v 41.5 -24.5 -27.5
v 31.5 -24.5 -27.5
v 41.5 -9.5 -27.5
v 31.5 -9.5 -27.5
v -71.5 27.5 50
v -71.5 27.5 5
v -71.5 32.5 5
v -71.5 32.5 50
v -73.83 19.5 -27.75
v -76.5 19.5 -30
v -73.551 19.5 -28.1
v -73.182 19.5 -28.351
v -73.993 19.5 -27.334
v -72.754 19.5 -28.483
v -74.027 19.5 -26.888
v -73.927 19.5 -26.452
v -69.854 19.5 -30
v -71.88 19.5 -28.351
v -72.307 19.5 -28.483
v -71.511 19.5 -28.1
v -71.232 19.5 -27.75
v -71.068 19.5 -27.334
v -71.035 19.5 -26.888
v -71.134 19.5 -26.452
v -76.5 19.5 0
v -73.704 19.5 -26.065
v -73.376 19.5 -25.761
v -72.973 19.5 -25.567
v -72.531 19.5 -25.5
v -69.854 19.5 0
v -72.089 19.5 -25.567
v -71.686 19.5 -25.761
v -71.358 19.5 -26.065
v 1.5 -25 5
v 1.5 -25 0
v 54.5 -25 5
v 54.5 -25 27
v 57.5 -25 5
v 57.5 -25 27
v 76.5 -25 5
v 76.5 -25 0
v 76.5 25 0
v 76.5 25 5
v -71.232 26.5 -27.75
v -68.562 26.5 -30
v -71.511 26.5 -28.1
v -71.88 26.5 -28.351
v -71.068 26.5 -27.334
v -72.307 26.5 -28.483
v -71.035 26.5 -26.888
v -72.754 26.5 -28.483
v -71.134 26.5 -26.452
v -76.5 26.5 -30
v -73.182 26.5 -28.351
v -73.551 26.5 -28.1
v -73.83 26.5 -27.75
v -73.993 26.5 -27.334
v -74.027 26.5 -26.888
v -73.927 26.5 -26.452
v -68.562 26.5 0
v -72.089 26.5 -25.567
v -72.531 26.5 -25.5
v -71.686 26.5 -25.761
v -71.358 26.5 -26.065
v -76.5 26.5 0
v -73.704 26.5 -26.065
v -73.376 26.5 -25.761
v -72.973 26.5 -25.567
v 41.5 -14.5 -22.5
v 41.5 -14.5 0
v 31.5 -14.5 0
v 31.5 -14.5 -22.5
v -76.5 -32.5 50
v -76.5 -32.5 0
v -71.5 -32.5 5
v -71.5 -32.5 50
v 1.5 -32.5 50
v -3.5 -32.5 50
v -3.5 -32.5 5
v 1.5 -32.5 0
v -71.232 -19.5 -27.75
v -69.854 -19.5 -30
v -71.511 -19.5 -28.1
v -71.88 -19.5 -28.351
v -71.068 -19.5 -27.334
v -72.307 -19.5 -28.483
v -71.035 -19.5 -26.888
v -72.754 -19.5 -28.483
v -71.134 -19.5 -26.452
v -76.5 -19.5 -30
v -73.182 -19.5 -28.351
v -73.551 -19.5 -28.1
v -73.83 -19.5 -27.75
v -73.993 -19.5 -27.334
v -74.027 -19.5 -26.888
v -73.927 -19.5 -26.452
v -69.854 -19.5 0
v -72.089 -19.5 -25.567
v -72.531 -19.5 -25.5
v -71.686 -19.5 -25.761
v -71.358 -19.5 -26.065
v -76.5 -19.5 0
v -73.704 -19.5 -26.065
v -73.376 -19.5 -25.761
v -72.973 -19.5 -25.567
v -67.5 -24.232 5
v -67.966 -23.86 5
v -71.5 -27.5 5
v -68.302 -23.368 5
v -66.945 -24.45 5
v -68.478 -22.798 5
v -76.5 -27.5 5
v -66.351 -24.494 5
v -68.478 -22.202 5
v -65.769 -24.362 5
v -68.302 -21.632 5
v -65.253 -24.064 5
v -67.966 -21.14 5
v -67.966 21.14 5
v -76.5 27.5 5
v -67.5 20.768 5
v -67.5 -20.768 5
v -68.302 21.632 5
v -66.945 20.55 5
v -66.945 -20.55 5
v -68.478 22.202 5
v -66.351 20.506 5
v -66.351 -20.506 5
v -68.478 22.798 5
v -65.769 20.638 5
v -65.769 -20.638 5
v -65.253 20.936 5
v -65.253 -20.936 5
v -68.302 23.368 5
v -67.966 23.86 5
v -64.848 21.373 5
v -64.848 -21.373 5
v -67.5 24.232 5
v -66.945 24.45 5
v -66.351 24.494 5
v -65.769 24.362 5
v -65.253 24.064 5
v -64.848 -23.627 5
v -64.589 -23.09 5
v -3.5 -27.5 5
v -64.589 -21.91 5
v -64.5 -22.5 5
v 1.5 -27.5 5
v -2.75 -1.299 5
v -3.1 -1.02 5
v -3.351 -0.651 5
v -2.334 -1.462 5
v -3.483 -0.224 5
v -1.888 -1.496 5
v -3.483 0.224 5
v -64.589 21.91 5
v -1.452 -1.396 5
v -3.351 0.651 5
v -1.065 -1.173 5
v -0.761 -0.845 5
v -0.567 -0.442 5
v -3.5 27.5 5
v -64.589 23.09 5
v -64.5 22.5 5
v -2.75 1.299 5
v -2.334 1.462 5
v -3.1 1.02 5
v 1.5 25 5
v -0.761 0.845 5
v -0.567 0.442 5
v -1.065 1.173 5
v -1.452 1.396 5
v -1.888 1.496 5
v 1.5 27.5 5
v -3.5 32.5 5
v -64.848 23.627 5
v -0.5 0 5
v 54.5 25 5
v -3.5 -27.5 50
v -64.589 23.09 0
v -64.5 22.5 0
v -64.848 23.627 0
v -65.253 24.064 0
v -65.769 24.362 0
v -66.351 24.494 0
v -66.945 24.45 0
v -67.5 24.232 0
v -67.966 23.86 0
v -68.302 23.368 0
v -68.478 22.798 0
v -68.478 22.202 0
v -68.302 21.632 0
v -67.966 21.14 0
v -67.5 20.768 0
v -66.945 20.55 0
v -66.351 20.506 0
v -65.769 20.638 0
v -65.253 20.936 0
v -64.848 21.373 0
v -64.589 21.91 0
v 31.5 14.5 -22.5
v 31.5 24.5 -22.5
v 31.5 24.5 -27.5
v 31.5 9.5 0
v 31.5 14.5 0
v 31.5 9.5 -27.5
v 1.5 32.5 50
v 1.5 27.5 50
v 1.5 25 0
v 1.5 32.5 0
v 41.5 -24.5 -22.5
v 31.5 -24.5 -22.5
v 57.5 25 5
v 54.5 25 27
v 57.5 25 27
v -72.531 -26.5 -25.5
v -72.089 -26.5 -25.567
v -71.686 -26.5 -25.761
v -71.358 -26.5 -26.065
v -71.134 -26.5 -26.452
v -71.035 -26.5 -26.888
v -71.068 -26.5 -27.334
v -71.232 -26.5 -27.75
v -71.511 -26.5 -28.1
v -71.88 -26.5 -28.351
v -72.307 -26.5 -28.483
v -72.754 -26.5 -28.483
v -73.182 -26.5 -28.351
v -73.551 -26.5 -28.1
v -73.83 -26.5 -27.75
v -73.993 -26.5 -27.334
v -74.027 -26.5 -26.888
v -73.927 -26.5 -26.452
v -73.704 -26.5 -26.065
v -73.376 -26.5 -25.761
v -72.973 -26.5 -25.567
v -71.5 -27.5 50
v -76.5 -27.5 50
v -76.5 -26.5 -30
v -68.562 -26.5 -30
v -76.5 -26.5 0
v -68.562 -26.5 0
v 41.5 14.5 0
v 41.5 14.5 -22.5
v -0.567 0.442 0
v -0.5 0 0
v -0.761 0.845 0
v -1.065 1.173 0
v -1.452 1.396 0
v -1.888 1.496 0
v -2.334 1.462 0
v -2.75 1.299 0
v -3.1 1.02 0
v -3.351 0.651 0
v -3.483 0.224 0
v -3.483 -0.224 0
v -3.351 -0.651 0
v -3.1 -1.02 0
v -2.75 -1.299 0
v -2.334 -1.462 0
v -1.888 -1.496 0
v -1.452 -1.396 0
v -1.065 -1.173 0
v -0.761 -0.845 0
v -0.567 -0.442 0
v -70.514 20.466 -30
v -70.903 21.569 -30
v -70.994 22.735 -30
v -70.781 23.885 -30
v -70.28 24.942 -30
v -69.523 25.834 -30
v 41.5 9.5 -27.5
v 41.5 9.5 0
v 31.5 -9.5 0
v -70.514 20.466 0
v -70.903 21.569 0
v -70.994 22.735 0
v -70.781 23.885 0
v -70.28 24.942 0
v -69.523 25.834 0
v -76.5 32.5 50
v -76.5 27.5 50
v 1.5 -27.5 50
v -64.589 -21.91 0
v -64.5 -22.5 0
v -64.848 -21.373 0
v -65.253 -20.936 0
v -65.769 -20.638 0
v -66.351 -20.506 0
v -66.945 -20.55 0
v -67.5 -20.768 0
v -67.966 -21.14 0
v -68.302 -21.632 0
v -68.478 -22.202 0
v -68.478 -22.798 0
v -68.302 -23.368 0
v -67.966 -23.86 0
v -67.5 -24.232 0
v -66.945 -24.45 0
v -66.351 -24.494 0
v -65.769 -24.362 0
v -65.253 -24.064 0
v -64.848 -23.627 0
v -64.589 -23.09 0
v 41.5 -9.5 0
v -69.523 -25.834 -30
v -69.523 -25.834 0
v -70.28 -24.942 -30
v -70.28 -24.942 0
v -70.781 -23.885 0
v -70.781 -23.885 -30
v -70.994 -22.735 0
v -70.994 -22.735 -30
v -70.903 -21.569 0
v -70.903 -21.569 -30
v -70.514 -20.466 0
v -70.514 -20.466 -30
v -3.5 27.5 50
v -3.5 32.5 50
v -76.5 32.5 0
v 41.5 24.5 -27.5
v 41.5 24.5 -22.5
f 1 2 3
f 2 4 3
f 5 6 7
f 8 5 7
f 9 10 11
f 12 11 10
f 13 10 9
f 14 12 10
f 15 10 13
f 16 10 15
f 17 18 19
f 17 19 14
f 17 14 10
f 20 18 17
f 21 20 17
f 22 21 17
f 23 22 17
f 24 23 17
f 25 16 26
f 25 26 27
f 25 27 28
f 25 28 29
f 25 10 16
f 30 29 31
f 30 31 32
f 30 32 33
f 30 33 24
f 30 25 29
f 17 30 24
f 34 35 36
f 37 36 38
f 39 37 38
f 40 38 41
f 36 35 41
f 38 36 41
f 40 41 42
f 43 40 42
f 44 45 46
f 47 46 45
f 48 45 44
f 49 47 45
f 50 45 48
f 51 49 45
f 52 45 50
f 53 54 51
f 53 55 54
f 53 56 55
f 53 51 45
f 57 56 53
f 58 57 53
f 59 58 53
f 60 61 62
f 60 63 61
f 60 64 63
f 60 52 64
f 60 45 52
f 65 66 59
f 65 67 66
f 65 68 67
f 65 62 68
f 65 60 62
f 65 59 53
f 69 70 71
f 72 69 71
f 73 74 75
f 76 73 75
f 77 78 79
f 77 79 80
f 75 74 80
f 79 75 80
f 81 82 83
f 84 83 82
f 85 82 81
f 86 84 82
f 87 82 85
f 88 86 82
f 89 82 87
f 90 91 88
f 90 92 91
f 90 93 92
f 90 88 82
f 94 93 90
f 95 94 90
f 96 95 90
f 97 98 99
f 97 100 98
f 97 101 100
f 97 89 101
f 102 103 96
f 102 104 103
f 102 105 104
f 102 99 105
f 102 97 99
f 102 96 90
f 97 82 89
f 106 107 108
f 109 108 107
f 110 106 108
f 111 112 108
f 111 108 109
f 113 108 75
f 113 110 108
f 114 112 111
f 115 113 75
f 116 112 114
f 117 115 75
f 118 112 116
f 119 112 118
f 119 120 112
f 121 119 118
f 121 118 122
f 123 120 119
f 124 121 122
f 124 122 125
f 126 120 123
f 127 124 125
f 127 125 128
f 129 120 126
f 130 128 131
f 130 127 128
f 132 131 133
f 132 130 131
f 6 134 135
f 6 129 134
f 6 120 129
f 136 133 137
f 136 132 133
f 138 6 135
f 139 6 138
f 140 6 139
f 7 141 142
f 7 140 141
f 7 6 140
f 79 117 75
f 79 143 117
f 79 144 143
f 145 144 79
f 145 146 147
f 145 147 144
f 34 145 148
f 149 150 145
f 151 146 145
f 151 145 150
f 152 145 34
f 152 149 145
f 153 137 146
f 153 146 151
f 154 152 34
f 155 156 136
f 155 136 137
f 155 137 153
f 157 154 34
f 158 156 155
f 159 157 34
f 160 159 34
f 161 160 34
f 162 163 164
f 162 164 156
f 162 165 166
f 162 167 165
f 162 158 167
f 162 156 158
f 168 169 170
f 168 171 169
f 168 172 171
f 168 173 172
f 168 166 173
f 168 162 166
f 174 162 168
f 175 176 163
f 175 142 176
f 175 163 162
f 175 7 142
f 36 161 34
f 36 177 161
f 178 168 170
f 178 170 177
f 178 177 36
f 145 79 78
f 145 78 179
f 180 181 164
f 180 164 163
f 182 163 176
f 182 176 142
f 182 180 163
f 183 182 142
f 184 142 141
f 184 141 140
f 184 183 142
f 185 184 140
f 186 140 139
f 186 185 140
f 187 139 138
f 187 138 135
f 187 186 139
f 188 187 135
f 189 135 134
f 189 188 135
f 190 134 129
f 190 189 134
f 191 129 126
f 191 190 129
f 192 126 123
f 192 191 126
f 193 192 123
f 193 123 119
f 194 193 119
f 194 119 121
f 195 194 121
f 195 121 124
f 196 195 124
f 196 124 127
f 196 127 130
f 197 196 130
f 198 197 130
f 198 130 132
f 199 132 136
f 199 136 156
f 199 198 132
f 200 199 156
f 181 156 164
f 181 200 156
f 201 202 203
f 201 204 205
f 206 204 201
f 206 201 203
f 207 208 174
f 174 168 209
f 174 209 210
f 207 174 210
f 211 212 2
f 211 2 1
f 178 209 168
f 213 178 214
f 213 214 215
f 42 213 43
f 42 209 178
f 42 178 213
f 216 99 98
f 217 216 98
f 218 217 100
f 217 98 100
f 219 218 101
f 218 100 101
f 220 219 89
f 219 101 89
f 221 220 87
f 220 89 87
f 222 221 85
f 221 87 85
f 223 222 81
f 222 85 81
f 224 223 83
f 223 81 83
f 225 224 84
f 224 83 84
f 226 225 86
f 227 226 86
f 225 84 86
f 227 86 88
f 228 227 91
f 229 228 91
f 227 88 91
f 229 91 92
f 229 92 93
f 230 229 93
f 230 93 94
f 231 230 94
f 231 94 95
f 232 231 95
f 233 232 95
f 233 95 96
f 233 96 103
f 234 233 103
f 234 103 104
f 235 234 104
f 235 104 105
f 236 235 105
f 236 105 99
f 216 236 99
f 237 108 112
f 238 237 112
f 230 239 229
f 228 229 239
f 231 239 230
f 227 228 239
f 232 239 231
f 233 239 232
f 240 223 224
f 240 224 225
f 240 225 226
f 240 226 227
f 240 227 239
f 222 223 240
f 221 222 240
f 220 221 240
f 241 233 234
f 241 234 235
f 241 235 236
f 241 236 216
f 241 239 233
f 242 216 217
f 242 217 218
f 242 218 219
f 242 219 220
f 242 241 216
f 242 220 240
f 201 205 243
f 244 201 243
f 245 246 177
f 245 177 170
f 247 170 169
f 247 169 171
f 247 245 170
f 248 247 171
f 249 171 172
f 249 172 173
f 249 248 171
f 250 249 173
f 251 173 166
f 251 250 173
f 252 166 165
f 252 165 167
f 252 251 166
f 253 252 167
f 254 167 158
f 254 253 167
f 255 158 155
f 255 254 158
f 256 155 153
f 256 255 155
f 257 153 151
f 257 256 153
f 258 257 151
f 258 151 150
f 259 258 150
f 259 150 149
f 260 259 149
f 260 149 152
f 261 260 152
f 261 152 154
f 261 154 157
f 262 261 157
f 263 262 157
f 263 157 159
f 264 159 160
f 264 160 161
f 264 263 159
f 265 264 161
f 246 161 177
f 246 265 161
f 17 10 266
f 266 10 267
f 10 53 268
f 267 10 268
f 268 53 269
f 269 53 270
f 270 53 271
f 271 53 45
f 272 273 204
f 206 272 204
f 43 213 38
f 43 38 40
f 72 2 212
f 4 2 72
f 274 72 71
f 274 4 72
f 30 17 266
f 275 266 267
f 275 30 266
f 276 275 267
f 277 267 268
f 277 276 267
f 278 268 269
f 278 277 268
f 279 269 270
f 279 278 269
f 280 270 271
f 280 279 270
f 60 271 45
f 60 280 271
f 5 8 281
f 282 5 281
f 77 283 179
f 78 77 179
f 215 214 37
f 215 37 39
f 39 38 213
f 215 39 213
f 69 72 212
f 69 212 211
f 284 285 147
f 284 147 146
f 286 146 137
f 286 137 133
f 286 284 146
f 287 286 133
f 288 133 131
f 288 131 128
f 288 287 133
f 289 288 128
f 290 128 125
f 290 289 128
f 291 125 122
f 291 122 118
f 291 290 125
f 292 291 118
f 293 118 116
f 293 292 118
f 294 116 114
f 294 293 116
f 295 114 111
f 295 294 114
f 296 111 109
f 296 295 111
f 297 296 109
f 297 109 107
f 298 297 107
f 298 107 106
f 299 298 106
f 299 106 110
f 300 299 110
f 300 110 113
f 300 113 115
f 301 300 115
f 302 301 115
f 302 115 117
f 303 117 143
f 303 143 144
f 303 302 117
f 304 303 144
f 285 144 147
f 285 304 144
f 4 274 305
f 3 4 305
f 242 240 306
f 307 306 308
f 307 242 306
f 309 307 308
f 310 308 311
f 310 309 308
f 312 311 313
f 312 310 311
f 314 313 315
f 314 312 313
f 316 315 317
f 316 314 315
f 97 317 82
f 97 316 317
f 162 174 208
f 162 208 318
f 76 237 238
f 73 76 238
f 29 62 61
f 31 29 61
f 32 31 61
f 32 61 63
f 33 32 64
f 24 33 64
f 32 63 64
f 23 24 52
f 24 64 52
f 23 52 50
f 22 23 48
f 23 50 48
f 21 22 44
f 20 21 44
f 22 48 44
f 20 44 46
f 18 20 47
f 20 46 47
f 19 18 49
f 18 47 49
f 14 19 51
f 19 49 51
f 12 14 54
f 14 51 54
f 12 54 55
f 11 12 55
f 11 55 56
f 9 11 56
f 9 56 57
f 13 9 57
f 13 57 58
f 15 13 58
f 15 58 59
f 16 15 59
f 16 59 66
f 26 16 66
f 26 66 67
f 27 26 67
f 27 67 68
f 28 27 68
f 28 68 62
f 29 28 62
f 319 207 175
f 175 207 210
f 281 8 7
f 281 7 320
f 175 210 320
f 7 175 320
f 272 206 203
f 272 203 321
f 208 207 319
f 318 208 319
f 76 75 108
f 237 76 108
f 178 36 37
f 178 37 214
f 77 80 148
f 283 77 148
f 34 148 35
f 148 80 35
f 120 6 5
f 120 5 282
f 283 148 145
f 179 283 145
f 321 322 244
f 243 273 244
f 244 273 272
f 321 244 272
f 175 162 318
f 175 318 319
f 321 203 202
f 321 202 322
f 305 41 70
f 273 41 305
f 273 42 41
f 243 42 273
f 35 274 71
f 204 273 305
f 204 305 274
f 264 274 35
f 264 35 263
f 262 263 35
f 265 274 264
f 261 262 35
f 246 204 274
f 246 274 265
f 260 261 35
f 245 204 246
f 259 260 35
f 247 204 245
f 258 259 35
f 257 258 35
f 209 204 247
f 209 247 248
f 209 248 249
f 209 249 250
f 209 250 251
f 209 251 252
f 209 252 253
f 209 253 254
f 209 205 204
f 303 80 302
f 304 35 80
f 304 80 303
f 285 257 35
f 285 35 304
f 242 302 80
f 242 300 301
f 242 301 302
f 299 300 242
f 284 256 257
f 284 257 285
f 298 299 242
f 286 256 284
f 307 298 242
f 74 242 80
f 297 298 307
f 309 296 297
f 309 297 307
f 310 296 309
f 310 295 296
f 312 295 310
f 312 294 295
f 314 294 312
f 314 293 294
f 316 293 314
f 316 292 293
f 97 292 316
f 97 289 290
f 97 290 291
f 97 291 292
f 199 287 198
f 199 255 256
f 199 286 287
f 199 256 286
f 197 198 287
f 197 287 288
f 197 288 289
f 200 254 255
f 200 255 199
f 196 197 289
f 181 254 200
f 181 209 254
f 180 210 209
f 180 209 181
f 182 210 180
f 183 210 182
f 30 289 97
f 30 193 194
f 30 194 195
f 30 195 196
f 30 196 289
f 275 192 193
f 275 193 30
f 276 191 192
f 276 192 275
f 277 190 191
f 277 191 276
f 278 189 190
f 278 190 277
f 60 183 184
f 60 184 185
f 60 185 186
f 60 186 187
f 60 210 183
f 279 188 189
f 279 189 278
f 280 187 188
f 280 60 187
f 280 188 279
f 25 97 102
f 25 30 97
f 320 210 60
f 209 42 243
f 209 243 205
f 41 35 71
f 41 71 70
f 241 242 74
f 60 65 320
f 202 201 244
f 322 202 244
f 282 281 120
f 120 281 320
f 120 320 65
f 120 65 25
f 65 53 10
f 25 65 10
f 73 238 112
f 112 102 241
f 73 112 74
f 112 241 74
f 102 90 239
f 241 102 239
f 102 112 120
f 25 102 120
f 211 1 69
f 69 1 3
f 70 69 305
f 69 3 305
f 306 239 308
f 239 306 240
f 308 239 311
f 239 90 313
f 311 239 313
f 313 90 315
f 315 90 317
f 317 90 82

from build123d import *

# Parameters (mm, degrees)
CROQUIS1_R               = 2
CROQUIS1_R_2             = 1.5
CROQUIS1_W               = 75
CROQUIS1_H               = 50
SALIENTE_EXTRUIR4_DEPTH  = 5
CROQUIS3_W               = 5
CROQUIS3_H               = 5
SALIENTE_EXTRUIR5_DEPTH  = 50
CROQUIS4_W               = 3
CROQUIS4_H               = 50
SALIENTE_EXTRUIR7_DEPTH  = 22
SALIENTE_EXTRUIR9_DEPTH  = 27.5
CROQUIS7_W               = 10
CROQUIS7_H               = 5
SALIENTE_EXTRUIR10_DEPTH = 10
CROQUIS8_W               = 10
CROQUIS8_H               = 5
SALIENTE_EXTRUIR11_DEPTH = 10
SALIENTE_EXTRUIR12_DEPTH = 30
CROQUIS10_R              = 1.5
CORTAR_EXTRUIR1_DEPTH    = 77


with BuildPart() as part:
    # Croquis1 → Saliente-Extruir4 (new body)
    # profile 1 of 2: a face of its own
    with BuildSketch(Plane.XY):
        Polygon((-71.5, -27.5), (-71.5, -32.5), (-3.5, -32.5), (-3.5, -27.5), (1.5, -27.5), (1.5, -25), (1.5, 25), (1.5, 27.5), (-3.5, 27.5), (-3.5, 32.5), (-71.5, 32.5), (-71.5, 27.5), (-76.5, 27.5), (-76.5, -27.5), align=None)
        with Locations((-66.5, -22.5)):
            Circle(CROQUIS1_R, mode=Mode.SUBTRACT)
        with Locations((-2, 0)):
            Circle(CROQUIS1_R_2, mode=Mode.SUBTRACT)
        with Locations((-66.5, 22.5)):
            Circle(CROQUIS1_R, mode=Mode.SUBTRACT)
    # profile 2 of 2: a face of its own
    with BuildSketch(Plane.XY):
        with Locations((39, 0)):
            Rectangle(CROQUIS1_W, CROQUIS1_H)
    extrude(amount=SALIENTE_EXTRUIR4_DEPTH)

    # Croquis3 → Saliente-Extruir5 (add)
    with BuildSketch(Plane(origin=(0, 0, 0), x_dir=(-1, 0, 0), z_dir=(0, 0, -1))):
        with Locations((74, 30)):
            Rectangle(CROQUIS3_W, CROQUIS3_H)
        with Locations((1, -30)):
            Rectangle(CROQUIS3_W, CROQUIS3_H)
        with Locations((1, 30)):
            Rectangle(CROQUIS3_W, CROQUIS3_H)
        with Locations((74, -30)):
            Rectangle(CROQUIS3_W, CROQUIS3_H)
    extrude(amount=-SALIENTE_EXTRUIR5_DEPTH)

    # Croquis4 → Saliente-Extruir7 (add)
    with BuildSketch(Plane.XY.offset(5)):
        with Locations((56, 0)):
            Rectangle(CROQUIS4_W, CROQUIS4_H)
    extrude(amount=SALIENTE_EXTRUIR7_DEPTH)

    # Croquis6 → Saliente-Extruir9 (add)
    with BuildSketch(Plane(origin=(0, 0, 0), x_dir=(-1, 0, 0), z_dir=(0, 0, -1))):
        Polygon((-31.5, 13.5), (-31.5, 14.5), (-41.5, 14.5), (-41.5, 13.5), (-41.5, 9.5), (-31.5, 9.5), align=None)
        Polygon((-31.5, -13.5), (-31.5, -9.5), (-41.5, -9.5), (-41.5, -13.5), (-41.5, -14.5), (-31.5, -14.5), align=None)
    extrude(amount=SALIENTE_EXTRUIR9_DEPTH)

    # Croquis7 → Saliente-Extruir10 (add)
    with BuildSketch(Plane(origin=(0, 14.5, 0), x_dir=(1, 0, 0), z_dir=(0, 1, 0))):
        with Locations((36.5, 25)):
            Rectangle(CROQUIS7_W, CROQUIS7_H)
    extrude(amount=SALIENTE_EXTRUIR10_DEPTH)

    # Croquis8 → Saliente-Extruir11 (add)
    with BuildSketch(Plane.XZ.offset(14.5)):
        with Locations((36.5, -25)):
            Rectangle(CROQUIS8_W, CROQUIS8_H)
    extrude(amount=SALIENTE_EXTRUIR11_DEPTH)

    # Croquis9 → Saliente-Extruir12 (add)
    with BuildSketch(Plane(origin=(0, 0, 0), x_dir=(-1, 0, 0), z_dir=(0, 0, -1))):
        with BuildLine():
            Line((69.854101966, -19.5), (76.5, -19.5))
            Line((76.5, -19.5), (76.5, -26.5))
            Line((76.5, -26.5), (68.561552813, -26.5))
            ThreePointArc((68.561552813, -26.5), (70.925192558, -23.317111271), (69.854101966, -19.5))
        make_face()
        with BuildLine():
            Line((68.561552813, 26.5), (76.5, 26.5))
            Line((76.5, 26.5), (76.5, 19.5))
            Line((76.5, 19.5), (69.854101966, 19.5))
            ThreePointArc((69.854101966, 19.5), (70.925192558, 23.317111271), (68.561552813, 26.5))
        make_face()
    extrude(amount=SALIENTE_EXTRUIR12_DEPTH)

    # Croquis10 → Cortar-Extruir1 (cut)
    with BuildSketch(Plane(origin=(0, 26.5, 0), x_dir=(1, 0, 0), z_dir=(0, 1, 0))):
        with Locations(Location((-72.530776406, 27, 0), (0, 0, 270))):
            Circle(CROQUIS10_R)
    extrude(amount=-CORTAR_EXTRUIR1_DEPTH, mode=Mode.SUBTRACT)


solid = part.part
